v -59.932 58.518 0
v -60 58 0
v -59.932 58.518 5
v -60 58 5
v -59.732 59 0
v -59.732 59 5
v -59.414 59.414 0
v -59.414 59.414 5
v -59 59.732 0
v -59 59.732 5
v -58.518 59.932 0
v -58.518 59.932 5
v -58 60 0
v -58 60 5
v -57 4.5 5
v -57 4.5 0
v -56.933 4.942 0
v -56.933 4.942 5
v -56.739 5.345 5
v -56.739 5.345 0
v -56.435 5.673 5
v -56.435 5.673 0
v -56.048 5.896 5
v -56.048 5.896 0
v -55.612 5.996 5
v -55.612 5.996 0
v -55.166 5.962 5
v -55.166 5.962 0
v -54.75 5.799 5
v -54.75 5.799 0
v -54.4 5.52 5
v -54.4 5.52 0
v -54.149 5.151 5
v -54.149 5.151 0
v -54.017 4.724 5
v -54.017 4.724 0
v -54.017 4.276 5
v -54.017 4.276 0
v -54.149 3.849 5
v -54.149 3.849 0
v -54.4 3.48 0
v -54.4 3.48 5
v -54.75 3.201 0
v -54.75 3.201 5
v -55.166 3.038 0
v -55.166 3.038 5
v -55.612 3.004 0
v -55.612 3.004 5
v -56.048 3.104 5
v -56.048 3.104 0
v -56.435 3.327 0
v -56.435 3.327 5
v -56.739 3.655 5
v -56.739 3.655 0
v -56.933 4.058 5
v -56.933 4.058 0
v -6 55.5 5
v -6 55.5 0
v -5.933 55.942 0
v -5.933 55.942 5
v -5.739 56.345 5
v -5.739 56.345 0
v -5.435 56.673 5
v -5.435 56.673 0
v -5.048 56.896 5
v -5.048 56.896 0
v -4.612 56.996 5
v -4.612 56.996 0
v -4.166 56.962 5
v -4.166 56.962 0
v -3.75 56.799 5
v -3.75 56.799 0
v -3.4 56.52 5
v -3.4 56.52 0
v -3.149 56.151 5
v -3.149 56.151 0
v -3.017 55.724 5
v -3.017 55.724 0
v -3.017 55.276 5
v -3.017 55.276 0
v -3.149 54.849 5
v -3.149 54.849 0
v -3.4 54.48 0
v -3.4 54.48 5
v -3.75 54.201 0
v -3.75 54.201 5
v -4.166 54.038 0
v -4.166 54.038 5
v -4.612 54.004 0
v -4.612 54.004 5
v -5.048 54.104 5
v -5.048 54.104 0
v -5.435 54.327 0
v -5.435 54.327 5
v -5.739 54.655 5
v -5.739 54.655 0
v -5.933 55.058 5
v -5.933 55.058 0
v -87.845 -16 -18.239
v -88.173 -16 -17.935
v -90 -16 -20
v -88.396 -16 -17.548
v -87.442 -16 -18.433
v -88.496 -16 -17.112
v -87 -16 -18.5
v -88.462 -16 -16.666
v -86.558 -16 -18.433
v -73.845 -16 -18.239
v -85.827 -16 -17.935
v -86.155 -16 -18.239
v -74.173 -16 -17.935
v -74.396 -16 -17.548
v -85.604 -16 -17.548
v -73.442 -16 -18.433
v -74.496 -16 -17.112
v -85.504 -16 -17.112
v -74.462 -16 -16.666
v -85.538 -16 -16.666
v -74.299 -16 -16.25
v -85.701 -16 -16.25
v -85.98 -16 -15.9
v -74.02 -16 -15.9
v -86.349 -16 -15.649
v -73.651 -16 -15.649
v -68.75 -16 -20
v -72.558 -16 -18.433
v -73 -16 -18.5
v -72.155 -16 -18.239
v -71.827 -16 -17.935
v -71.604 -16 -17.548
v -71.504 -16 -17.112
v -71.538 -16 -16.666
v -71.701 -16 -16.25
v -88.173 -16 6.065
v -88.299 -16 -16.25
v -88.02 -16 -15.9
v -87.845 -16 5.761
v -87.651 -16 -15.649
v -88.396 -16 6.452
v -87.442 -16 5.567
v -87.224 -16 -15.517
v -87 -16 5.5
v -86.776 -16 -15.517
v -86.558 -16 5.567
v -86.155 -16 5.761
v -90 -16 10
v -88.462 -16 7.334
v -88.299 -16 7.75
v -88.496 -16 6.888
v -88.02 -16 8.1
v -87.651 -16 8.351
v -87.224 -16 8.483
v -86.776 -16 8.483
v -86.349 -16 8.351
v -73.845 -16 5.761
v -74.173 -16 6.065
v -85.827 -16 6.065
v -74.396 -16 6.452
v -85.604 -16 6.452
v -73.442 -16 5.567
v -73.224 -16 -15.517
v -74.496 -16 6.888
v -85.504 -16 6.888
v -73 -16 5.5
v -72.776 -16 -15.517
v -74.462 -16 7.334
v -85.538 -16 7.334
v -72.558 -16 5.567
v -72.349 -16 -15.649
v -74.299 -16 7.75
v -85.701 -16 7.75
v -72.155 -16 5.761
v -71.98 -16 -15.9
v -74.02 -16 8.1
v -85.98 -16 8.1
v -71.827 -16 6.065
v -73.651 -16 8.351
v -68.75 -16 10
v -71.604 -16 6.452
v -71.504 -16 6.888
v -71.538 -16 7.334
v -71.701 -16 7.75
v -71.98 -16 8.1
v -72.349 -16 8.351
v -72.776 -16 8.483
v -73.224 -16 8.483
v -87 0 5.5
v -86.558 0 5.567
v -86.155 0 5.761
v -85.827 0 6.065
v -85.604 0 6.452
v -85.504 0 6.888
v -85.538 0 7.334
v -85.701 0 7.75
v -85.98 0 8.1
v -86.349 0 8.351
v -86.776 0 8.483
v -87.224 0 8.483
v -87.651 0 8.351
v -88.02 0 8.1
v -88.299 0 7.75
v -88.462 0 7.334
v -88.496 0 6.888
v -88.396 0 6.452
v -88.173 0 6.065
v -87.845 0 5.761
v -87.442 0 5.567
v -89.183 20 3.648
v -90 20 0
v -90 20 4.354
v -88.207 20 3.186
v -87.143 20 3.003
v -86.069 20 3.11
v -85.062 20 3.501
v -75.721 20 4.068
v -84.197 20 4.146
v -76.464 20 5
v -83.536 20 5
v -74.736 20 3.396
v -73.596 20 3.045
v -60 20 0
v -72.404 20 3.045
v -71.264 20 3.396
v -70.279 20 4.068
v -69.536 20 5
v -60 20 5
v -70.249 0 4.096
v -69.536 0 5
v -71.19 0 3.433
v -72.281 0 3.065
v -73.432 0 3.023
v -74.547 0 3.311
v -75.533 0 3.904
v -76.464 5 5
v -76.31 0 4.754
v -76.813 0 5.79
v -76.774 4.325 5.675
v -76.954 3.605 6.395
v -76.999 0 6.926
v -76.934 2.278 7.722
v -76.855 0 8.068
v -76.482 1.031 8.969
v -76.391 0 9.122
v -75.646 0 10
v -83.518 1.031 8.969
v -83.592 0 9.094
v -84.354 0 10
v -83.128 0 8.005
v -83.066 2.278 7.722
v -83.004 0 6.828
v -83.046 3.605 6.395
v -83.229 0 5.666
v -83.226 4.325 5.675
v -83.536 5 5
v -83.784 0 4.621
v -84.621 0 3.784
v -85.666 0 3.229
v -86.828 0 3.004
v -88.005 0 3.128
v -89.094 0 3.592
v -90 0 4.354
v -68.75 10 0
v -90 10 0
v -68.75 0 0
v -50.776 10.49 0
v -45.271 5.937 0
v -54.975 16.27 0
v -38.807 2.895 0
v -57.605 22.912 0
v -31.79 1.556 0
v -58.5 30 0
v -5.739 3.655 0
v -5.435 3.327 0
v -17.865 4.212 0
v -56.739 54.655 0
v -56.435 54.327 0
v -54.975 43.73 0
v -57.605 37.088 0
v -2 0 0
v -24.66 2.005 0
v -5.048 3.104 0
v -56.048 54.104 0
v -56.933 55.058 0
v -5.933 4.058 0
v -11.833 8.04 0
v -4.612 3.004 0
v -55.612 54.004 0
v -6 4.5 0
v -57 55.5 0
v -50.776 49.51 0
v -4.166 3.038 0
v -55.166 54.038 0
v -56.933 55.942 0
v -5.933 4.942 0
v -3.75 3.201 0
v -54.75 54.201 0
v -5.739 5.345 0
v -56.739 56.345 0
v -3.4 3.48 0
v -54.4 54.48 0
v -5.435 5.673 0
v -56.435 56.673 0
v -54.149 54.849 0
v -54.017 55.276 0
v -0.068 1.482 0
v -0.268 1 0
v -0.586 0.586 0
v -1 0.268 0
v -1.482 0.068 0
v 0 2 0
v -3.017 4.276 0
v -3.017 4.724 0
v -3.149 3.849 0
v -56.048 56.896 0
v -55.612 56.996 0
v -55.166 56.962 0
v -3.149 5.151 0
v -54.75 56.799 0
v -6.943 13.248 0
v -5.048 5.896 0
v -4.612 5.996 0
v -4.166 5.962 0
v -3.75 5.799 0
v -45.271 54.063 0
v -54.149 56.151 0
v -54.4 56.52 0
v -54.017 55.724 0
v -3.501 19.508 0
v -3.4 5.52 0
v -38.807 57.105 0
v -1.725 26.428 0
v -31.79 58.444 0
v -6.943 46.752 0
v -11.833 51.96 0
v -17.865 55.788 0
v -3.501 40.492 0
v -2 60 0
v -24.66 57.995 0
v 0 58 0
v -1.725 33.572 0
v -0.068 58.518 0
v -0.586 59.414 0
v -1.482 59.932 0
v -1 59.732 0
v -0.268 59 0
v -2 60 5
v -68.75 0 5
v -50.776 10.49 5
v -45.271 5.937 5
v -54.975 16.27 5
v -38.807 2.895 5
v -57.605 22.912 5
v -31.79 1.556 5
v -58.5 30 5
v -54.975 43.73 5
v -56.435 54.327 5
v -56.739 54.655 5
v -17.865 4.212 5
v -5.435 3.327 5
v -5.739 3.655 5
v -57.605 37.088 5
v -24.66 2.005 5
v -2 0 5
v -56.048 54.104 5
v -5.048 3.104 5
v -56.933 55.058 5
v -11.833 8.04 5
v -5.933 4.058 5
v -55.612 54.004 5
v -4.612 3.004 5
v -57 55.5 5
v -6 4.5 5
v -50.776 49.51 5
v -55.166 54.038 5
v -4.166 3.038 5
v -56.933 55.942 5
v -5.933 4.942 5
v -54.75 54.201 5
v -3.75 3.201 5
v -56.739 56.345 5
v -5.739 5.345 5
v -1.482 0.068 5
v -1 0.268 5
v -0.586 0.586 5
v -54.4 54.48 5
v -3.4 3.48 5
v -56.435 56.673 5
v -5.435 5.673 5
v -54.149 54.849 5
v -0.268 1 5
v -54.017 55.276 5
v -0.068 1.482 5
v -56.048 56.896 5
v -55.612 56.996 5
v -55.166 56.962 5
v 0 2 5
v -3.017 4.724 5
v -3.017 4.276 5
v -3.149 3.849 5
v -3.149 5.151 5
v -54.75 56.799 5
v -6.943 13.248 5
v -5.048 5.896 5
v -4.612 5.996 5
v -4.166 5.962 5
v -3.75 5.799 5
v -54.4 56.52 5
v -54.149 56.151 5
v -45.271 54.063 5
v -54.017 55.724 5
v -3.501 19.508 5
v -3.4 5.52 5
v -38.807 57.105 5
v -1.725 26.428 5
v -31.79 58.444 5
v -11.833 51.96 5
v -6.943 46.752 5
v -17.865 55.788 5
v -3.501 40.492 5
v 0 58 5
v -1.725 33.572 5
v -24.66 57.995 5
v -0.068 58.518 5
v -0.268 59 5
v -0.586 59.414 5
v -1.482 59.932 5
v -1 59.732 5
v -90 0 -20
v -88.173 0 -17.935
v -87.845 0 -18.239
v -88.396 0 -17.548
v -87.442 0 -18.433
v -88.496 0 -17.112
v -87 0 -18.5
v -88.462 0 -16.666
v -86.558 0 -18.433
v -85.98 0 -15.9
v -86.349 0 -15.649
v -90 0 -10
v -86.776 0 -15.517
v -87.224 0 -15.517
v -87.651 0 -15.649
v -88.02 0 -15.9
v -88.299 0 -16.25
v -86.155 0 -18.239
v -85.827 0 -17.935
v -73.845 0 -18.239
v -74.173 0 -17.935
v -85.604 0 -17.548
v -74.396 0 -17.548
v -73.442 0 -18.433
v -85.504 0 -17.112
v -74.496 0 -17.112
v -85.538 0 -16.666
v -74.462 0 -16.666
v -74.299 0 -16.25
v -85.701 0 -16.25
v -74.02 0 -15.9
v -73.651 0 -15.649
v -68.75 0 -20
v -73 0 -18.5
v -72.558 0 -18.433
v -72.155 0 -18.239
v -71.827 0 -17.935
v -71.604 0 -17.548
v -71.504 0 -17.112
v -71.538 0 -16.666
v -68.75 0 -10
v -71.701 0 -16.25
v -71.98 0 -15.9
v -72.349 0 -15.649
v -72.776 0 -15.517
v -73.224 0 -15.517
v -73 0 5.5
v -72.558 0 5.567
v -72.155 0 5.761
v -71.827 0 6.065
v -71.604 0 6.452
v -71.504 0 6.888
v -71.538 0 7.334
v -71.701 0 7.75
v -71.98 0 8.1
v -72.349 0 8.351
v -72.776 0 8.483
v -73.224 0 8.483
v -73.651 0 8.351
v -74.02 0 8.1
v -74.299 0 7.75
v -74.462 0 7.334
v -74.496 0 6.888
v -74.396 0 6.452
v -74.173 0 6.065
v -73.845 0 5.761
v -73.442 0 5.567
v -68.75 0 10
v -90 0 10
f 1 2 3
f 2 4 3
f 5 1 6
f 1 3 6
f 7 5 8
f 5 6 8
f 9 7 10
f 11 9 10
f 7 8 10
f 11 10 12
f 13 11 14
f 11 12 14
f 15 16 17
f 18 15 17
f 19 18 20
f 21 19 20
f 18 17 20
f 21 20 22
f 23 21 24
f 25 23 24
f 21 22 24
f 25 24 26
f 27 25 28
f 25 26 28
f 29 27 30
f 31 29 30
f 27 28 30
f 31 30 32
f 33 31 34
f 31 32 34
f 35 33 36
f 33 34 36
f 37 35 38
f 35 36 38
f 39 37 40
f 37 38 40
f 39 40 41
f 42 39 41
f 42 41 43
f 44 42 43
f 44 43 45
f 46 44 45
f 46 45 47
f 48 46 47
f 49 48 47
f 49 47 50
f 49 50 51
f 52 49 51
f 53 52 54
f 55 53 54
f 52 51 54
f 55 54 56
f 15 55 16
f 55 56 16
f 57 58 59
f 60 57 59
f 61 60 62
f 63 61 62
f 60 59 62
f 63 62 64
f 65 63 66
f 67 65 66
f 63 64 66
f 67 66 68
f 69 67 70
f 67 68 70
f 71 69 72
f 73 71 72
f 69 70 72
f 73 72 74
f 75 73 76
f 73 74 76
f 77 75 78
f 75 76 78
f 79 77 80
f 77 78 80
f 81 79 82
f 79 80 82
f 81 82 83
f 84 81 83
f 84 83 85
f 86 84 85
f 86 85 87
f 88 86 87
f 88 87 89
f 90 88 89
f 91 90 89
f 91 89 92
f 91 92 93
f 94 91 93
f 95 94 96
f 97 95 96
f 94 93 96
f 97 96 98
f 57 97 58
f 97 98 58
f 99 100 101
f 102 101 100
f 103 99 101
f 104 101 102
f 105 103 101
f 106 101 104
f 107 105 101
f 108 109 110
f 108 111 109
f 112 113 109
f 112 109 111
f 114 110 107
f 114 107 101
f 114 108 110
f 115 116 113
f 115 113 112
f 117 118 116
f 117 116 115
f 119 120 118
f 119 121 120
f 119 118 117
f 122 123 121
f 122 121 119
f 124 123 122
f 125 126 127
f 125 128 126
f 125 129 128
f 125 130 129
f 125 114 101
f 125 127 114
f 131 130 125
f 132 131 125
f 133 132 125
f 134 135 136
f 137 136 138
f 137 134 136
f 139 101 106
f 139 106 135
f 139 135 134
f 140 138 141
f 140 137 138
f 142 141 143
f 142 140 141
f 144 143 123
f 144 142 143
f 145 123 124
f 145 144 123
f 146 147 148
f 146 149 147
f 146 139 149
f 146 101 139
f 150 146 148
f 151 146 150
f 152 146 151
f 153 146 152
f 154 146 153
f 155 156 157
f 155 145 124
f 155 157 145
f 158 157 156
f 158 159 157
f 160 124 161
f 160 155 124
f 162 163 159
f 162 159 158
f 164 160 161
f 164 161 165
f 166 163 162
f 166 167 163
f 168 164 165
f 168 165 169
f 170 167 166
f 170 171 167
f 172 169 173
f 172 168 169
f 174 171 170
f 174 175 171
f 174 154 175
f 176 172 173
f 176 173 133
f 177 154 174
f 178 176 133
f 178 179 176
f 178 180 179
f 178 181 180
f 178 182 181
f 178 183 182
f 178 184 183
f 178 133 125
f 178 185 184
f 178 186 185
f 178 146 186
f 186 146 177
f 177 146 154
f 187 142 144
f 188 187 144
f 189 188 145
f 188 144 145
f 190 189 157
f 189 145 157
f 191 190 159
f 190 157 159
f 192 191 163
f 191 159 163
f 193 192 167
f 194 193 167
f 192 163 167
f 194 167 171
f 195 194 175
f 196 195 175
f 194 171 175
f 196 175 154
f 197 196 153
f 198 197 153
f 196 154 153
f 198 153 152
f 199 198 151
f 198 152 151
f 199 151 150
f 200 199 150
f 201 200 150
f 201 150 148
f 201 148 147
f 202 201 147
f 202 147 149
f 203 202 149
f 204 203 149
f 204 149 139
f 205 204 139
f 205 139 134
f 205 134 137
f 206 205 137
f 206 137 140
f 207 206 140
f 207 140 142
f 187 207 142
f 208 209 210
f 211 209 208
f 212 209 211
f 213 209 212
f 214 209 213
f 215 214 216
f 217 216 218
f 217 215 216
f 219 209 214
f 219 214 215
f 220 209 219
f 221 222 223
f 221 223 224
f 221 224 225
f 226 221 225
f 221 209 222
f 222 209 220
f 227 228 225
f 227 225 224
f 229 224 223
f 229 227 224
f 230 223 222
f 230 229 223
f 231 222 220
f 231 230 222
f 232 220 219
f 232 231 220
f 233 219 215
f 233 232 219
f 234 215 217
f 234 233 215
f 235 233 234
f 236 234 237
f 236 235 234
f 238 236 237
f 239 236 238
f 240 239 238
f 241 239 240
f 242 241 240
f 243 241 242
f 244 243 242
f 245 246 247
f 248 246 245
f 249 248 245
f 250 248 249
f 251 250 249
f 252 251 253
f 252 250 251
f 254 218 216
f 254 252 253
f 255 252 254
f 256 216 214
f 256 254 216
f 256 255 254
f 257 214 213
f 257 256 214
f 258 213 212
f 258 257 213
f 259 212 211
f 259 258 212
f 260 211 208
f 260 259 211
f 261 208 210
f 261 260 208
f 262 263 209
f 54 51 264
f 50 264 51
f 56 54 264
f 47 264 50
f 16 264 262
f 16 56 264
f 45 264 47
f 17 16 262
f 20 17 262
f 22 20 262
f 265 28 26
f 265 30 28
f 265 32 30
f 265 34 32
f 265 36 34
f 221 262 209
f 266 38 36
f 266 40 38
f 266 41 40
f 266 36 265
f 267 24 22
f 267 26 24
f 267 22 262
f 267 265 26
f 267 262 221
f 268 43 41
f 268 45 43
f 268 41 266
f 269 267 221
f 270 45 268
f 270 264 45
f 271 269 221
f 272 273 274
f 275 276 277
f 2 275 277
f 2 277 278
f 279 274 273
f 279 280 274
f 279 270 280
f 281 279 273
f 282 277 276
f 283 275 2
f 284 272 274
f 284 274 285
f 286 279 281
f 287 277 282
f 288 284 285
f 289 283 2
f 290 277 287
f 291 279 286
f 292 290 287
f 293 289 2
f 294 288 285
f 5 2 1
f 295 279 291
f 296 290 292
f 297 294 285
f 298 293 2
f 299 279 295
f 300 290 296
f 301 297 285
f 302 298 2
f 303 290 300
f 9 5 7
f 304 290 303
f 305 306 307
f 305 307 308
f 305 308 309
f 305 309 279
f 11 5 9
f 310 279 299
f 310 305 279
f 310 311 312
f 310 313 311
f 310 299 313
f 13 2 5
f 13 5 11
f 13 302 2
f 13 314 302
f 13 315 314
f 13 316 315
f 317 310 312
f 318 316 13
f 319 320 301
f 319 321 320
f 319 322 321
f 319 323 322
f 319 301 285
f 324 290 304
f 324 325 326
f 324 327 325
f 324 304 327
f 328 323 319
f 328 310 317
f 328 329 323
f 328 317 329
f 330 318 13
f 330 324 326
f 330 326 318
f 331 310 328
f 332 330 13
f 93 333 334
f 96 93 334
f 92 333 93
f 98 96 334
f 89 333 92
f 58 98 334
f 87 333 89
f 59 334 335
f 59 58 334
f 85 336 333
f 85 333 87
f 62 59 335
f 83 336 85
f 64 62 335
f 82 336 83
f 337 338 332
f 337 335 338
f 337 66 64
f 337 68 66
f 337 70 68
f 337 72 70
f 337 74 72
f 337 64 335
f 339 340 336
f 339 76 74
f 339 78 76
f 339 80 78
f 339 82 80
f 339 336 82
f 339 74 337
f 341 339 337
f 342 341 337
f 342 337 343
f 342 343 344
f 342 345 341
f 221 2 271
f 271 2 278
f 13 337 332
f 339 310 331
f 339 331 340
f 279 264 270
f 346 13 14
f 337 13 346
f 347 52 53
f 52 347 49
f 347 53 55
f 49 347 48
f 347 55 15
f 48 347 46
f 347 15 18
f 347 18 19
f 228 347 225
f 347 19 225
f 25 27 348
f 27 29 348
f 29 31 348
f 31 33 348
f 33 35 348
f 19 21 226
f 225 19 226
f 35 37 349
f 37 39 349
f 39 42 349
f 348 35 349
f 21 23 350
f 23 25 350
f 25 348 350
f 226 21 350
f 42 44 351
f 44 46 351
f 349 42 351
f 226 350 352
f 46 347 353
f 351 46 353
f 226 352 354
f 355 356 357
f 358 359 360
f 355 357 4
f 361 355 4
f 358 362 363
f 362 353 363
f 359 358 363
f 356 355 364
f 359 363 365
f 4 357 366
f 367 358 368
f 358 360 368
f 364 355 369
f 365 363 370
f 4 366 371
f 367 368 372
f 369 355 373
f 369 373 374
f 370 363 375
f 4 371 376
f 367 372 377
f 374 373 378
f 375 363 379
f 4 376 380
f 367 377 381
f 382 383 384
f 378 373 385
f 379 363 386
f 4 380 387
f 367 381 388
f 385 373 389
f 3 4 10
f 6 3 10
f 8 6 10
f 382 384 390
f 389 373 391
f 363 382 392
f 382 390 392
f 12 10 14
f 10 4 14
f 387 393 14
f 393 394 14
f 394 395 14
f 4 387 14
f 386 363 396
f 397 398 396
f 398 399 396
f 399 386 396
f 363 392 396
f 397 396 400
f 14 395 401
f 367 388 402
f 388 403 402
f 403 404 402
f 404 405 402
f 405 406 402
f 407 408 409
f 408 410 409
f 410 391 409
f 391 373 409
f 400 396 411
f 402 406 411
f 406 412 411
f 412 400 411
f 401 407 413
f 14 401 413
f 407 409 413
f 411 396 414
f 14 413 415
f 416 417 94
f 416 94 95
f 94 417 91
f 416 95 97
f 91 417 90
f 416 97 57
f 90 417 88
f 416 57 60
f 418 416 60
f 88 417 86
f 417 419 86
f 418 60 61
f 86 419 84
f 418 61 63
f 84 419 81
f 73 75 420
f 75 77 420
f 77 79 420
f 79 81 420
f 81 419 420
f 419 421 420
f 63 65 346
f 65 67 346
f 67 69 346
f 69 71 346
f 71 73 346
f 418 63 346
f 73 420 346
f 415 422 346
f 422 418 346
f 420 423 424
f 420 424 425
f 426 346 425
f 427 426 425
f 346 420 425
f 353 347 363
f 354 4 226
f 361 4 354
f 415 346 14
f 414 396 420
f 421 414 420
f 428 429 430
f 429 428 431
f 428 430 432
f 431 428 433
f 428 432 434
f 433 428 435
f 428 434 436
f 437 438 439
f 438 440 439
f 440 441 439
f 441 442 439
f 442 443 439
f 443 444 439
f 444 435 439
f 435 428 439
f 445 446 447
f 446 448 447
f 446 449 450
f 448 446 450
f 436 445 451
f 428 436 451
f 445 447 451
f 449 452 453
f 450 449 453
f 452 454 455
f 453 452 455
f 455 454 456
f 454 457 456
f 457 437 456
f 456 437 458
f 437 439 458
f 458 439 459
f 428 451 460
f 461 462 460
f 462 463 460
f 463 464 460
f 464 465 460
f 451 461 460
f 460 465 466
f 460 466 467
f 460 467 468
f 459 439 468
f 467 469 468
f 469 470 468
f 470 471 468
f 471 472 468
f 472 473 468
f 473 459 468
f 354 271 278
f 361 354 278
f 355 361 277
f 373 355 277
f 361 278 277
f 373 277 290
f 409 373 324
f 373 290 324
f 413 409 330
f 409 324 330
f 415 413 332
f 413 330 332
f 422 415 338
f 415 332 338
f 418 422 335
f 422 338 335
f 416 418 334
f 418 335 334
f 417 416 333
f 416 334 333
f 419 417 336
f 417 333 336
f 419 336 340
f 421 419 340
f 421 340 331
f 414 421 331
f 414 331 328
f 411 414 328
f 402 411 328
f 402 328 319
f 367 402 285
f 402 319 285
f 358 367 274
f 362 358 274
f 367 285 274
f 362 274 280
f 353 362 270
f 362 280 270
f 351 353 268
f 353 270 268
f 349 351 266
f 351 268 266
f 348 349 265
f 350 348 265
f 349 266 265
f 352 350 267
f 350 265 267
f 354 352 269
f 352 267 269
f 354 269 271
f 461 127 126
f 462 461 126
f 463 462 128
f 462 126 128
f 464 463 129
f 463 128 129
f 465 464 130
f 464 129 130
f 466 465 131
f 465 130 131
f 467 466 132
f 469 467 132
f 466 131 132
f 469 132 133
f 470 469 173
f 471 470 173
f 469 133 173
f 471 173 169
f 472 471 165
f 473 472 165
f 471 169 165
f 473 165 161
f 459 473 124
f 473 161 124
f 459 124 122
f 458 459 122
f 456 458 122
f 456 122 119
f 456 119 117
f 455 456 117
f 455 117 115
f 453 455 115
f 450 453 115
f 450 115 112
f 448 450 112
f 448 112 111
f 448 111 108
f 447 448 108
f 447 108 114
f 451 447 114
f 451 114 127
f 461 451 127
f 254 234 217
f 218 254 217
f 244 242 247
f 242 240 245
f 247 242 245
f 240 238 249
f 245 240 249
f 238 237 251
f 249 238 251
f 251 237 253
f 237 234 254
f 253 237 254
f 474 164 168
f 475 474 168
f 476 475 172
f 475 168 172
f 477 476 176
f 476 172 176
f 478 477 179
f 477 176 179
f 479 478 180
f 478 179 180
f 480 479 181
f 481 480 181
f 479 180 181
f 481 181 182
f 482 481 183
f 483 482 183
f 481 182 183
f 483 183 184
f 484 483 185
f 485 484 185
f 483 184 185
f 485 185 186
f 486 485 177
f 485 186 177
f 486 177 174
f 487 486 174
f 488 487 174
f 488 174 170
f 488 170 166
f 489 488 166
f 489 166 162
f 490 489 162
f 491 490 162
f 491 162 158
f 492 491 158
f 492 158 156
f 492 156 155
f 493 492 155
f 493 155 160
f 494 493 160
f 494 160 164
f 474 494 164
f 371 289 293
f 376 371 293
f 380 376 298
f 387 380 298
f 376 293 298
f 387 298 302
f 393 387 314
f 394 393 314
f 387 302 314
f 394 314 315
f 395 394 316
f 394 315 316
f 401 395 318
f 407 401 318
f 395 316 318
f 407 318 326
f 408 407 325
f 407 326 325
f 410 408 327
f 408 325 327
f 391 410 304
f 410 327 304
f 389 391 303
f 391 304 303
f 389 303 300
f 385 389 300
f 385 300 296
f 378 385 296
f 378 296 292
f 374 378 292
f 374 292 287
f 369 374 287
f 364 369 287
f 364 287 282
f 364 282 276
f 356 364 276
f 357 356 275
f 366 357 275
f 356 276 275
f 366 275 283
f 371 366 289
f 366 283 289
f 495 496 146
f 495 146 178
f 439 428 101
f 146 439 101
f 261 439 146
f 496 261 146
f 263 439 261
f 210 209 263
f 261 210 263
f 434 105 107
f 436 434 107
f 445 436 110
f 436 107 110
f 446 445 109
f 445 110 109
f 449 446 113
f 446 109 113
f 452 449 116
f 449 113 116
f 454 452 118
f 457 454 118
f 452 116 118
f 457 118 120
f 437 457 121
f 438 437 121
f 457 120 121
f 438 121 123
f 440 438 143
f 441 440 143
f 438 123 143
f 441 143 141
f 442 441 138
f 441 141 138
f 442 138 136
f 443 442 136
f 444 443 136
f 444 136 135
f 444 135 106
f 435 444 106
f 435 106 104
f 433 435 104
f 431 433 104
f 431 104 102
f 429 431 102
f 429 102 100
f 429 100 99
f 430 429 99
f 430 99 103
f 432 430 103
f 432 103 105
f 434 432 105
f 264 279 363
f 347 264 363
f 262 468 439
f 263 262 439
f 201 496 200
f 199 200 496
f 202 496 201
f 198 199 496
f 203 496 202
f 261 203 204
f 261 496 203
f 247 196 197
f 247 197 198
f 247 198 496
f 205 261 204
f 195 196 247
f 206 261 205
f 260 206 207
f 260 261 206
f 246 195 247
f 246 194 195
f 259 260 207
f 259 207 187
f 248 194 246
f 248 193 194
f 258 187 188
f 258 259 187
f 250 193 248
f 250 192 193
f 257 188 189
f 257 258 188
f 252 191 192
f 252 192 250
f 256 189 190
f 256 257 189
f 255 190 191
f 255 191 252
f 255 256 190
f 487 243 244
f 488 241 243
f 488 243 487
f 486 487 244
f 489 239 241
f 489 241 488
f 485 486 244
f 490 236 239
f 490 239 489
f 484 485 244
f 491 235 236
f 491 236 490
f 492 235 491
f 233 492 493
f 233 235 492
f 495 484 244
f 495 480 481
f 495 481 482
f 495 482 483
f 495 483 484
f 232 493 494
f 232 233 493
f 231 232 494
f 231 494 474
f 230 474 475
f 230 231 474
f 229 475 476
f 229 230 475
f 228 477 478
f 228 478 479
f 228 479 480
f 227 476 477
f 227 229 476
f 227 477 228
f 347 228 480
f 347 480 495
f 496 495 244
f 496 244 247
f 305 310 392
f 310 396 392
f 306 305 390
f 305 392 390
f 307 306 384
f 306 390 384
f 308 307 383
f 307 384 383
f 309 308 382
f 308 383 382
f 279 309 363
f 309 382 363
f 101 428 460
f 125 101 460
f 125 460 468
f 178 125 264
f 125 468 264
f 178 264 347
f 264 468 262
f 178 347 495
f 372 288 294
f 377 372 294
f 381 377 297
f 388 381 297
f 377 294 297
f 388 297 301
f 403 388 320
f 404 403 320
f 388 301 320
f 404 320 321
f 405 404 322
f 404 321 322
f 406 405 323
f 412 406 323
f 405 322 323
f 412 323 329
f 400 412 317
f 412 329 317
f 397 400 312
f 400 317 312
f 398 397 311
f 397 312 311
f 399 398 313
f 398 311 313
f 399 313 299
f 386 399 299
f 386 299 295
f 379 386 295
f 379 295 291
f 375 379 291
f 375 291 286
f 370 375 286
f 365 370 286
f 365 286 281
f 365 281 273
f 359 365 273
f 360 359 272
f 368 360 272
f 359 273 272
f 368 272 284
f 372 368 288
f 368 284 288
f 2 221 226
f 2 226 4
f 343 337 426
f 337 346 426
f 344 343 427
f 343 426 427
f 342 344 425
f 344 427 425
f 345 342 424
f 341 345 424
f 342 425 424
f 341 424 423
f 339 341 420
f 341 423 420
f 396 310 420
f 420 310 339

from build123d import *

# Parameters (mm, degrees)
SKETCH_1_W          = 60
SKETCH_1_H          = 60
EXTRUDE_1_DEPTH     = 5
SKETCH_2_R          = 1.5
CUT_EXTRUDE_1_DEPTH = 5
SKETCH_3_R          = 28.5
CUT_EXTRUDE_2_DEPTH = 5
SKETCH_4_W          = 5
SKETCH_4_H          = 20
EXTRUDE_2_DEPTH     = 30
SKETCH_5_W          = 21.25
SKETCH_5_H          = 30
EXTRUDE_3_DEPTH     = 16
SKETCH_6_R          = 1.5
CUT_EXTRUDE_3_DEPTH = 30
SKETCH_7_R          = 4
CUT_EXTRUDE_4_DEPTH = 30
CHAMFER_1_SIZE      = 10
CHAMFER_2_SIZE      = 5
FILLET_1_R          = 2


with BuildPart() as part:
    # 草图1 → 凸台-拉伸1 (new body)
    with BuildSketch(Plane.XY):
        with Locations((-30, 30)):
            Rectangle(SKETCH_1_W, SKETCH_1_H)
    extrude(amount=EXTRUDE_1_DEPTH)

    # 草图2 → 切除-拉伸1 (cut)
    with BuildSketch(Plane(origin=(0, 0, 0), x_dir=(-1, 0, 0), z_dir=(0, 0, -1))):
        with Locations((4.5, 55.5)):
            Circle(SKETCH_2_R)
        with Locations((55.5, 55.5)):
            Circle(SKETCH_2_R)
        with Locations((4.5, 4.5)):
            Circle(SKETCH_2_R)
        with Locations((55.5, 4.5)):
            Circle(SKETCH_2_R)
    extrude(amount=-CUT_EXTRUDE_1_DEPTH, mode=Mode.SUBTRACT)

    # 草图3 → 切除-拉伸2 (cut)
    with BuildSketch(Plane(origin=(0, 0, 0), x_dir=(-1, 0, 0), z_dir=(0, 0, -1))):
        with Locations((30, 30)):
            Circle(SKETCH_3_R)
    extrude(amount=-CUT_EXTRUDE_2_DEPTH, mode=Mode.SUBTRACT)

    # 草图4 → 凸台-拉伸2 (add)
    with BuildSketch(Plane.ZY.offset(60)):
        with Locations((2.5, 10)):
            Rectangle(SKETCH_4_W, SKETCH_4_H)
    extrude(amount=EXTRUDE_2_DEPTH)

    # 草图5 → 凸台-拉伸3 (add)
    with BuildSketch(Plane.XZ):
        with Locations((-79.375, -5)):
            Rectangle(SKETCH_5_W, SKETCH_5_H)
    extrude(amount=EXTRUDE_3_DEPTH)

    # 草图6 → 切除-拉伸3 (cut)
    with BuildSketch(Plane.XZ.offset(16)):
        with Locations(Location((-87, 7, 0), (0, 0, 270))):
            Circle(SKETCH_6_R)
        with Locations(Location((-73, 7, 0), (0, 0, 270))):
            Circle(SKETCH_6_R)
        with Locations(Location((-87, -17, 0), (0, 0, 270))):
            Circle(SKETCH_6_R)
        with Locations(Location((-73, -17, 0), (0, 0, 270))):
            Circle(SKETCH_6_R)
    extrude(amount=-CUT_EXTRUDE_3_DEPTH, mode=Mode.SUBTRACT)

    # 草图7 → 切除-拉伸4 (cut)
    with BuildSketch(Plane(origin=(0, 0, 0), x_dir=(1, 0, 0), z_dir=(0, 1, 0))):
        with Locations((-87, -7)):
            Circle(SKETCH_7_R)
        with Locations((-73, -7)):
            Circle(SKETCH_7_R)
    extrude(amount=CUT_EXTRUDE_4_DEPTH, mode=Mode.SUBTRACT)

    # 倒角1
    chamfer_1_edges = [part.edges().sort_by_distance(p)[0] for p in [
        (-79.375, 0, 0),
    ]]
    chamfer(chamfer_1_edges, length=CHAMFER_1_SIZE)

    # 倒角2
    chamfer_2_edges = [part.edges().sort_by_distance(p)[0] for p in [
        (-80, 0, 5),
    ]]
    chamfer(chamfer_2_edges, length=CHAMFER_2_SIZE - 0.0001)  # a hair under: the kernel refuses the full size

    # 圆角1
    fillet_1_edges = [part.edges().sort_by_distance(p)[0] for p in [
        (0, 0, 2.5),
        (-60, 60, 2.5),
        (0, 60, 2.5),
    ]]
    fillet(fillet_1_edges, radius=FILLET_1_R)


solid = part.part
